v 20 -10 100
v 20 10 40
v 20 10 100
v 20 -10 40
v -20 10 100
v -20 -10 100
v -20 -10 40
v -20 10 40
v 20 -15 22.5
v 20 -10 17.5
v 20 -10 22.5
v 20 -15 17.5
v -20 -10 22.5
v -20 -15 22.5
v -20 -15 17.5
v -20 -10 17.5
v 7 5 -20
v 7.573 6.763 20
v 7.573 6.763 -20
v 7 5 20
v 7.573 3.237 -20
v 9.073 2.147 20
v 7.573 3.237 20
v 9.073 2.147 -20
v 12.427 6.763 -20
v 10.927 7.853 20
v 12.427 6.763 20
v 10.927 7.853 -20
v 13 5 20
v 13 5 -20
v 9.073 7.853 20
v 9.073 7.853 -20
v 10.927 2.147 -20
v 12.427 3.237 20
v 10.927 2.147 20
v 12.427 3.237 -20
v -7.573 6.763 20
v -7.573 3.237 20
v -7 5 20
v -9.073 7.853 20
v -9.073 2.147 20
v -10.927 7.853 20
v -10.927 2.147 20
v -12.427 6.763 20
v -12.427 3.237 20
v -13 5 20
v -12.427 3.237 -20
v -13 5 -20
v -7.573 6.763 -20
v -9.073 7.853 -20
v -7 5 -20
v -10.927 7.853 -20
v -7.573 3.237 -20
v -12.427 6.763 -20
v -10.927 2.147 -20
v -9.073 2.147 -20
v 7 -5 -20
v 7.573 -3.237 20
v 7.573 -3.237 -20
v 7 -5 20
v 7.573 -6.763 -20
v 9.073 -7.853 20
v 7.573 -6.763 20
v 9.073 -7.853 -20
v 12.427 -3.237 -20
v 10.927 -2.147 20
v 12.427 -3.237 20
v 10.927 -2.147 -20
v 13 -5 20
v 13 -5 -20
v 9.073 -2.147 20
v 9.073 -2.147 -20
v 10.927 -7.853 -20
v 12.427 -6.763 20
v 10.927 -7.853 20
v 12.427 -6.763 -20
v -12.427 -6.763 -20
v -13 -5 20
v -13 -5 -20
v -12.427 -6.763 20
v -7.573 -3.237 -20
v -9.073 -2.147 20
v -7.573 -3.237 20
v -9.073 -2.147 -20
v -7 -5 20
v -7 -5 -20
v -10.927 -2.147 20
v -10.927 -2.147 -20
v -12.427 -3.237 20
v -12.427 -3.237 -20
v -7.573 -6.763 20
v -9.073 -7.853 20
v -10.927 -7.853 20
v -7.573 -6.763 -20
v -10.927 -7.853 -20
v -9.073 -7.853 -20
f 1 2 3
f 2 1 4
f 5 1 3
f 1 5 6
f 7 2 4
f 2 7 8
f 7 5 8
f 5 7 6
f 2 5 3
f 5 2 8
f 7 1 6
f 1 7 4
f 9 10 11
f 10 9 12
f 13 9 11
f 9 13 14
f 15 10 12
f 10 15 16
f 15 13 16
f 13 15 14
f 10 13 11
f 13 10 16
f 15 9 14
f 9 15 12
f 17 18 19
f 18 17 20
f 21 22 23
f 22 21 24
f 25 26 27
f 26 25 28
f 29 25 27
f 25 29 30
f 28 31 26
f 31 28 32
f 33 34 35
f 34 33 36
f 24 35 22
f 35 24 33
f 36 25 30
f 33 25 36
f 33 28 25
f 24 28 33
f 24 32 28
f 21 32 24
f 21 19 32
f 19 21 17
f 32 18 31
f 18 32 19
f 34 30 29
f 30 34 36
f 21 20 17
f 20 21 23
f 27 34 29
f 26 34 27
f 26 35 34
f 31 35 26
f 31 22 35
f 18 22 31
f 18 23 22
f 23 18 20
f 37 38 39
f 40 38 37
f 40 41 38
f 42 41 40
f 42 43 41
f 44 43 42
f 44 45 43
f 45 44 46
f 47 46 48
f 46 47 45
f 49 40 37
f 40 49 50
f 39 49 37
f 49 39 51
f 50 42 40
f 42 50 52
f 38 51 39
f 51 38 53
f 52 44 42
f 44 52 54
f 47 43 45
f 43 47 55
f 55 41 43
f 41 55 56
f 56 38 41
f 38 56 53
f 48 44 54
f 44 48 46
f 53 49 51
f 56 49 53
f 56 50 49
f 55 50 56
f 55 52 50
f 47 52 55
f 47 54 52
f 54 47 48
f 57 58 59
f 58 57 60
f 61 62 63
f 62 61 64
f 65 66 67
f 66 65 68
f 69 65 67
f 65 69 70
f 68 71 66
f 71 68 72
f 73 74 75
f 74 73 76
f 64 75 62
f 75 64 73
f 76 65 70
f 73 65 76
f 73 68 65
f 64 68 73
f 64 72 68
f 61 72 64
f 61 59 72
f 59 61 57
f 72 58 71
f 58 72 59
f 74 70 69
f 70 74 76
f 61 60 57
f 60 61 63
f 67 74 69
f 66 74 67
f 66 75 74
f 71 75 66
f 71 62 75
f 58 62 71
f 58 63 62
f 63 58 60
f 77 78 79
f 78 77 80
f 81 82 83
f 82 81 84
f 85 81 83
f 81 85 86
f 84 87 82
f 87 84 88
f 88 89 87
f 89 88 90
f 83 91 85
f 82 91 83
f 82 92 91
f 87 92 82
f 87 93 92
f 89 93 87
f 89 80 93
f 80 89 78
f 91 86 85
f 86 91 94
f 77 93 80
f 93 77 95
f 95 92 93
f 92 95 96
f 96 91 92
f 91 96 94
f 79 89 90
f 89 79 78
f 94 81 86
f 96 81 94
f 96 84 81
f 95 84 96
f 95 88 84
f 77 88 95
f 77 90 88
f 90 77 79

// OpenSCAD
seat_width = 40;
seat_depth = 20;
seat_height = 60;
back_thickness = 5;
leg_height = 40;
leg_radius = 3;

union() {
    // Seat
    translate([0, 0, leg_height + seat_height / 2])
    cube([seat_width, seat_depth, seat_height], center = true);

    // Backrest
    translate([0, -seat_depth / 2 - back_thickness / 2, leg_height / 2])
    cube([seat_width, back_thickness, back_thickness], center = true);

    // Legs
    translate([seat_width / 4, seat_depth / 4, 0]) cylinder(r = leg_radius, h = leg_height, center = true);
    translate([-seat_width / 4, seat_depth / 4, 0]) cylinder(r = leg_radius, h = leg_height, center = true);
    translate([seat_width / 4, -seat_depth / 4, 0]) cylinder(r = leg_radius, h = leg_height, center = true);
    translate([-seat_width / 4, -seat_depth / 4, 0]) cylinder(r = leg_radius, h = leg_height, center = true);
}
